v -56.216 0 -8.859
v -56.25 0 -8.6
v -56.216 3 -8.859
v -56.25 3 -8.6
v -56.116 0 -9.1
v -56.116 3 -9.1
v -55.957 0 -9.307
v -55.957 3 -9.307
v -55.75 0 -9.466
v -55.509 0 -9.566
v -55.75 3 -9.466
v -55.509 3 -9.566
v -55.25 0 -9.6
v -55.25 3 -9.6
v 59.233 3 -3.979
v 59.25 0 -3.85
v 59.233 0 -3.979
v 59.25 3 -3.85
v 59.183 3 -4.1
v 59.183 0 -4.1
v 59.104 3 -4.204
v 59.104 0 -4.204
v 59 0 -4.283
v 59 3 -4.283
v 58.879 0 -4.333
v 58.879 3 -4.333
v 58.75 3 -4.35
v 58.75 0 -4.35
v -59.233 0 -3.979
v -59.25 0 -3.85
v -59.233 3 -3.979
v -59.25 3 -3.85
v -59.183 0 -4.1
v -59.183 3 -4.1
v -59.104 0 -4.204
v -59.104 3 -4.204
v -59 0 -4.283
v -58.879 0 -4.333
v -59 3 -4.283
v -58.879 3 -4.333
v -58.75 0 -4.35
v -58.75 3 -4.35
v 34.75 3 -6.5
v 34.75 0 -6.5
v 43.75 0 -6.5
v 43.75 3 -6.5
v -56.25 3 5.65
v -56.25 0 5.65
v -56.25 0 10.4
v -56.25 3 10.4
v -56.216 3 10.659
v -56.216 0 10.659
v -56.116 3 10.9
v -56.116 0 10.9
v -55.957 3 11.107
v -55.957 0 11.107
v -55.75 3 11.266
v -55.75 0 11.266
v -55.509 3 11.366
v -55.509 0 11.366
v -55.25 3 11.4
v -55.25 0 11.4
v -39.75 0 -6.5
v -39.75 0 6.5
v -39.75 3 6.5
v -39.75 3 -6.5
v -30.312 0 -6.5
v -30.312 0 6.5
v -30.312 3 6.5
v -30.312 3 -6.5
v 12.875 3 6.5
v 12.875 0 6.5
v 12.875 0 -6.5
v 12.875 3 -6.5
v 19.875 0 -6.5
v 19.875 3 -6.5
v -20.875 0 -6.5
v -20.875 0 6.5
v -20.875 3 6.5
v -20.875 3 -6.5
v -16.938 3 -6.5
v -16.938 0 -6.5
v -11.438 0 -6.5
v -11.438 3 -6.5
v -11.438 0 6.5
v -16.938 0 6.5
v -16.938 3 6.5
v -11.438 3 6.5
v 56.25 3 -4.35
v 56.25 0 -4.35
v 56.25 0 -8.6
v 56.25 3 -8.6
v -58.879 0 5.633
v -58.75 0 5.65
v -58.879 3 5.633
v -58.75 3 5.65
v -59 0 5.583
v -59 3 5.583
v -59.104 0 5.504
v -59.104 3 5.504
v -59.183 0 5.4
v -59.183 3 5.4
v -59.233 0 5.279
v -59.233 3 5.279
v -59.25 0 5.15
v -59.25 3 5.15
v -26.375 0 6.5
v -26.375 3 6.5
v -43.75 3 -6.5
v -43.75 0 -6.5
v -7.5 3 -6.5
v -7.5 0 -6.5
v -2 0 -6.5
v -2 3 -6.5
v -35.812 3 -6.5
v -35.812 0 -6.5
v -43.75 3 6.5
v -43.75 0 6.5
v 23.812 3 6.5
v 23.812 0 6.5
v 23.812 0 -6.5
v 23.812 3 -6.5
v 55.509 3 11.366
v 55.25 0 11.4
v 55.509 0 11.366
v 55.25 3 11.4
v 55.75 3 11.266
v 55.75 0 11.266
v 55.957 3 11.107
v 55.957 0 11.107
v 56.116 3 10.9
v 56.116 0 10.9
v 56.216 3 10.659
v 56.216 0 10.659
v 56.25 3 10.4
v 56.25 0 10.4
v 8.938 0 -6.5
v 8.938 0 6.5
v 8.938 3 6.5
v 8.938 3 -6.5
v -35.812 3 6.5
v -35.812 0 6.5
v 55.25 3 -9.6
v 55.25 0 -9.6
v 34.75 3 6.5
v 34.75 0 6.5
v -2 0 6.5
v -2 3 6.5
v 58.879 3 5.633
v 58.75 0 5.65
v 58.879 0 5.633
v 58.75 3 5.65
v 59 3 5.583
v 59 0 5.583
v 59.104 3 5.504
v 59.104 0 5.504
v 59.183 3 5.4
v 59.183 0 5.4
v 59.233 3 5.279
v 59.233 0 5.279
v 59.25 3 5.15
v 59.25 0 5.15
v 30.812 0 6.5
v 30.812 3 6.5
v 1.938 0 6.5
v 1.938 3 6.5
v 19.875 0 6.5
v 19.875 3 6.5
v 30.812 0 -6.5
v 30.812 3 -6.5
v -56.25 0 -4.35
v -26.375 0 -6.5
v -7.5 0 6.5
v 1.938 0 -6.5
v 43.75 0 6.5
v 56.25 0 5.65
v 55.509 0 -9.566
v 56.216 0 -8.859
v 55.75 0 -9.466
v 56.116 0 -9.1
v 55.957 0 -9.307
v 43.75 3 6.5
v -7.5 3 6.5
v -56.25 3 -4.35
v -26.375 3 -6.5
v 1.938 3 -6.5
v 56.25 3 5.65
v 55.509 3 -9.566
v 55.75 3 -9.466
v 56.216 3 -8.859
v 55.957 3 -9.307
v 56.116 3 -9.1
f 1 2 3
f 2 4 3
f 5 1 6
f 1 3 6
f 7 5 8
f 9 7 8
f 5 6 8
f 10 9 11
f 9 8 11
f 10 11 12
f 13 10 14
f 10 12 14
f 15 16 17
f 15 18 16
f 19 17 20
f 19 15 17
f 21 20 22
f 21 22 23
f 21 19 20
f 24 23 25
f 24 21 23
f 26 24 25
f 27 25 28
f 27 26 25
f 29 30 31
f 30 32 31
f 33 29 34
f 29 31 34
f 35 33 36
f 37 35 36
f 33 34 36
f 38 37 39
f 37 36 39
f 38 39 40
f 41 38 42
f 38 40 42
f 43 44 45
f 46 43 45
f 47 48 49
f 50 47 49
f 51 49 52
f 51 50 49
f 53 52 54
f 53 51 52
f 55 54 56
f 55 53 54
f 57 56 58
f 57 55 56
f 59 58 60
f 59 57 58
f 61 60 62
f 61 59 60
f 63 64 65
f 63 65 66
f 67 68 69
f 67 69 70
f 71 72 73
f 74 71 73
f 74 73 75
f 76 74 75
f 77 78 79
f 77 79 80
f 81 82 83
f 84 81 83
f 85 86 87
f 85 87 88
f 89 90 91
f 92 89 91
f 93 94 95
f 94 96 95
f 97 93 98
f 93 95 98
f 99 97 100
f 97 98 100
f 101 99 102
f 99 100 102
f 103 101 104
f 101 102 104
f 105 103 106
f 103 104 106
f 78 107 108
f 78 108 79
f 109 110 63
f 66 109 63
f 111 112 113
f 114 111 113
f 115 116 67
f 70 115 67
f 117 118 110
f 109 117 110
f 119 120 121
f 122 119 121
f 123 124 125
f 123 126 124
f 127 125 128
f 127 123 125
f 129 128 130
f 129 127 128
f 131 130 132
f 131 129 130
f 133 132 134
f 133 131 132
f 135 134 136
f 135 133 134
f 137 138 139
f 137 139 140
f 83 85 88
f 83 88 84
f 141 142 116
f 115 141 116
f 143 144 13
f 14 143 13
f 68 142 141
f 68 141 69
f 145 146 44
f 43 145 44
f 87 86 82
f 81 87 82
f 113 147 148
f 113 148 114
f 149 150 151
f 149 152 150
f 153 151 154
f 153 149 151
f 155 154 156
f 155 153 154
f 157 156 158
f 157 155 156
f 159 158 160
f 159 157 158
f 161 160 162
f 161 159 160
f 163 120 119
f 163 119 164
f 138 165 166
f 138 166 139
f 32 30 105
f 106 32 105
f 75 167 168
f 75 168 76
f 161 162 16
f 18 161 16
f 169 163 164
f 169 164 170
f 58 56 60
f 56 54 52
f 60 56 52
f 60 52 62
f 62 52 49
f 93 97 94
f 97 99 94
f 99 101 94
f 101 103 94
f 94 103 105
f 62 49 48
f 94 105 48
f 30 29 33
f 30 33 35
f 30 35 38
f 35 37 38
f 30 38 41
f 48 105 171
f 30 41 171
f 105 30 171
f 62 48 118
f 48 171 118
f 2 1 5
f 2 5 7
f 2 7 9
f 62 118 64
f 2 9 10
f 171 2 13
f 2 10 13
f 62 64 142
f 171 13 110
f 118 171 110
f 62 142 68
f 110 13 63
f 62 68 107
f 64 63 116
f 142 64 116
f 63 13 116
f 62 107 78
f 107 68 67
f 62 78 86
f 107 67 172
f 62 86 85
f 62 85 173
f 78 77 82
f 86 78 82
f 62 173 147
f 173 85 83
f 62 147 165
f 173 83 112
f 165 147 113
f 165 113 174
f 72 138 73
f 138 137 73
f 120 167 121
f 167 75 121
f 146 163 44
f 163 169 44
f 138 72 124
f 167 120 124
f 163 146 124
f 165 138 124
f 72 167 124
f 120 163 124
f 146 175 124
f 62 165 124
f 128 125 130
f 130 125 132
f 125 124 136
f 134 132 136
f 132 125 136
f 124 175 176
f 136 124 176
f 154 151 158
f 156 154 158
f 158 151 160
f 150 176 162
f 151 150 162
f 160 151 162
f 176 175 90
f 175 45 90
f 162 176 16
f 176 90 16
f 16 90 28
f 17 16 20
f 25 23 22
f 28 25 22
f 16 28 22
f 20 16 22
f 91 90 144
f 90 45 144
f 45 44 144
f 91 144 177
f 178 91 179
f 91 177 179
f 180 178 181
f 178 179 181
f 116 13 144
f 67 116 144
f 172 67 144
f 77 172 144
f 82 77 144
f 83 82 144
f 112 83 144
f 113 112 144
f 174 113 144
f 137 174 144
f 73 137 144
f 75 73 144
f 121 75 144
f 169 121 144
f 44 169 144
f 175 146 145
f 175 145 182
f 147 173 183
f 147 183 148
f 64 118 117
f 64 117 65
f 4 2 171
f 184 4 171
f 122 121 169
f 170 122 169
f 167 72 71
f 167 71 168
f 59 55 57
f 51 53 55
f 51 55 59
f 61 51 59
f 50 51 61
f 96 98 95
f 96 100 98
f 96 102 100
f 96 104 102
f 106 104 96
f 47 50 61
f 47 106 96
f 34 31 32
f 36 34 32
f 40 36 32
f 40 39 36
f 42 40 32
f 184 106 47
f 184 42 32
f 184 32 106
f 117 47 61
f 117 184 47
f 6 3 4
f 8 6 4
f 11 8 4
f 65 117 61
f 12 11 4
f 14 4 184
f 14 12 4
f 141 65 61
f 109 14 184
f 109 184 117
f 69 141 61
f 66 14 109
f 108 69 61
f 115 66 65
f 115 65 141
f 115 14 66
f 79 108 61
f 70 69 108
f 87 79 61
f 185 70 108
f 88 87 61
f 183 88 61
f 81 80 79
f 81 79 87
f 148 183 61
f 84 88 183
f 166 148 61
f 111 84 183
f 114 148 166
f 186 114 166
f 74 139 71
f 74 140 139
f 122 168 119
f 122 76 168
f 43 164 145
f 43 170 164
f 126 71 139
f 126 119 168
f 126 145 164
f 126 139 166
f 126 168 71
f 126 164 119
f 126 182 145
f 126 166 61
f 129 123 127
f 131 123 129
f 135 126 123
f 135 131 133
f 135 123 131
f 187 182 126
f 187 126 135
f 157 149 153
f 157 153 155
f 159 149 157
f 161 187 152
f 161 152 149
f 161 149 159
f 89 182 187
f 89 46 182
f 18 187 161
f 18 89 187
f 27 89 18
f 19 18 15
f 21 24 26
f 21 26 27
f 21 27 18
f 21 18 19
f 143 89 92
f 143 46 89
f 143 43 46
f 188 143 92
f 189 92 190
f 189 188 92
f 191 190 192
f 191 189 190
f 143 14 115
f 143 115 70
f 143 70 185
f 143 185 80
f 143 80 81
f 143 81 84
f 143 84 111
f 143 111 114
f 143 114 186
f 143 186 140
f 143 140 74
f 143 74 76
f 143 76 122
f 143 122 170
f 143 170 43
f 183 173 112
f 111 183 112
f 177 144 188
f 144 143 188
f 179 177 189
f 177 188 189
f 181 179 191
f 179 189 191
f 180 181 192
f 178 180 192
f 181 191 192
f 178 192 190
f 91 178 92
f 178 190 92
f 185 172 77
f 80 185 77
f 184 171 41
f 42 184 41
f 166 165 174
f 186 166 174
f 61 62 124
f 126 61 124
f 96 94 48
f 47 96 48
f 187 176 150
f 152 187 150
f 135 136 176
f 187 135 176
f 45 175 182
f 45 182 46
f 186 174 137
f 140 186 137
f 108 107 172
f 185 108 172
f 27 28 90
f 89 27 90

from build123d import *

# Parameters (mm, degrees)
SKETCH_1_W      = 4
SKETCH_1_H      = 13
SKETCH_1_W_2    = 9
SKETCH_1_W_3    = 5.5
SKETCH_1_W_4    = 7
EXTRUDE_1_DEPTH = 3
FILLET_1_R      = 0.5
FILLET_2_R      = 1


with BuildPart() as part:
    # Эскиз1 → Бобышка-Вытянуть1 (new body)
    with BuildSketch(Plane(origin=(0, 0, 0), x_dir=(1, 0, 0), z_dir=(0, 1, 0))):
        Polygon((-56.25, -11.4), (56.25, -11.4), (56.25, -5.65), (59.25, -5.65), (59.25, 4.35), (56.25, 4.35), (56.25, 9.6), (-56.25, 9.6), (-56.25, 4.35), (-59.25, 4.35), (-59.25, -5.65), (-56.25, -5.65), align=None)
        with Locations((-41.75, 0)):
            Rectangle(SKETCH_1_W, SKETCH_1_H, mode=Mode.SUBTRACT)
        with Locations((39.25, 0)):
            Rectangle(SKETCH_1_W_2, SKETCH_1_H, mode=Mode.SUBTRACT)
        with Locations((-23.625, 0)):
            Rectangle(SKETCH_1_W_3, SKETCH_1_H, mode=Mode.SUBTRACT)
        with Locations((-33.0625, 0)):
            Rectangle(SKETCH_1_W_3, SKETCH_1_H, mode=Mode.SUBTRACT)
        with Locations((-14.1875, 0)):
            Rectangle(SKETCH_1_W_3, SKETCH_1_H, mode=Mode.SUBTRACT)
        with Locations((-4.75, 0)):
            Rectangle(SKETCH_1_W_3, SKETCH_1_H, mode=Mode.SUBTRACT)
        with Locations((16.375, 0)):
            Rectangle(SKETCH_1_W_4, SKETCH_1_H, mode=Mode.SUBTRACT)
        with Locations((5.4375, 0)):
            Rectangle(SKETCH_1_W_4, SKETCH_1_H, mode=Mode.SUBTRACT)
        with Locations((27.3125, 0)):
            Rectangle(SKETCH_1_W_4, SKETCH_1_H, mode=Mode.SUBTRACT)
    extrude(amount=EXTRUDE_1_DEPTH)

    # Скругление1
    fillet_1_edges = [part.edges().sort_by_distance(p)[0] for p in [
        (-59.25, 1.5, 5.65),
        (-59.25, 1.5, -4.35),
        (59.25, 1.5, -4.35),
        (59.25, 1.5, 5.65),
    ]]
    fillet(fillet_1_edges, radius=FILLET_1_R)

    # Скругление2
    fillet_2_edges = [part.edges().sort_by_distance(p)[0] for p in [
        (-56.25, 1.5, -9.6),
        (56.25, 1.5, -9.6),
        (56.25, 1.5, 11.4),
        (-56.25, 1.5, 11.4),
    ]]
    fillet(fillet_2_edges, radius=FILLET_2_R)


solid = part.part
